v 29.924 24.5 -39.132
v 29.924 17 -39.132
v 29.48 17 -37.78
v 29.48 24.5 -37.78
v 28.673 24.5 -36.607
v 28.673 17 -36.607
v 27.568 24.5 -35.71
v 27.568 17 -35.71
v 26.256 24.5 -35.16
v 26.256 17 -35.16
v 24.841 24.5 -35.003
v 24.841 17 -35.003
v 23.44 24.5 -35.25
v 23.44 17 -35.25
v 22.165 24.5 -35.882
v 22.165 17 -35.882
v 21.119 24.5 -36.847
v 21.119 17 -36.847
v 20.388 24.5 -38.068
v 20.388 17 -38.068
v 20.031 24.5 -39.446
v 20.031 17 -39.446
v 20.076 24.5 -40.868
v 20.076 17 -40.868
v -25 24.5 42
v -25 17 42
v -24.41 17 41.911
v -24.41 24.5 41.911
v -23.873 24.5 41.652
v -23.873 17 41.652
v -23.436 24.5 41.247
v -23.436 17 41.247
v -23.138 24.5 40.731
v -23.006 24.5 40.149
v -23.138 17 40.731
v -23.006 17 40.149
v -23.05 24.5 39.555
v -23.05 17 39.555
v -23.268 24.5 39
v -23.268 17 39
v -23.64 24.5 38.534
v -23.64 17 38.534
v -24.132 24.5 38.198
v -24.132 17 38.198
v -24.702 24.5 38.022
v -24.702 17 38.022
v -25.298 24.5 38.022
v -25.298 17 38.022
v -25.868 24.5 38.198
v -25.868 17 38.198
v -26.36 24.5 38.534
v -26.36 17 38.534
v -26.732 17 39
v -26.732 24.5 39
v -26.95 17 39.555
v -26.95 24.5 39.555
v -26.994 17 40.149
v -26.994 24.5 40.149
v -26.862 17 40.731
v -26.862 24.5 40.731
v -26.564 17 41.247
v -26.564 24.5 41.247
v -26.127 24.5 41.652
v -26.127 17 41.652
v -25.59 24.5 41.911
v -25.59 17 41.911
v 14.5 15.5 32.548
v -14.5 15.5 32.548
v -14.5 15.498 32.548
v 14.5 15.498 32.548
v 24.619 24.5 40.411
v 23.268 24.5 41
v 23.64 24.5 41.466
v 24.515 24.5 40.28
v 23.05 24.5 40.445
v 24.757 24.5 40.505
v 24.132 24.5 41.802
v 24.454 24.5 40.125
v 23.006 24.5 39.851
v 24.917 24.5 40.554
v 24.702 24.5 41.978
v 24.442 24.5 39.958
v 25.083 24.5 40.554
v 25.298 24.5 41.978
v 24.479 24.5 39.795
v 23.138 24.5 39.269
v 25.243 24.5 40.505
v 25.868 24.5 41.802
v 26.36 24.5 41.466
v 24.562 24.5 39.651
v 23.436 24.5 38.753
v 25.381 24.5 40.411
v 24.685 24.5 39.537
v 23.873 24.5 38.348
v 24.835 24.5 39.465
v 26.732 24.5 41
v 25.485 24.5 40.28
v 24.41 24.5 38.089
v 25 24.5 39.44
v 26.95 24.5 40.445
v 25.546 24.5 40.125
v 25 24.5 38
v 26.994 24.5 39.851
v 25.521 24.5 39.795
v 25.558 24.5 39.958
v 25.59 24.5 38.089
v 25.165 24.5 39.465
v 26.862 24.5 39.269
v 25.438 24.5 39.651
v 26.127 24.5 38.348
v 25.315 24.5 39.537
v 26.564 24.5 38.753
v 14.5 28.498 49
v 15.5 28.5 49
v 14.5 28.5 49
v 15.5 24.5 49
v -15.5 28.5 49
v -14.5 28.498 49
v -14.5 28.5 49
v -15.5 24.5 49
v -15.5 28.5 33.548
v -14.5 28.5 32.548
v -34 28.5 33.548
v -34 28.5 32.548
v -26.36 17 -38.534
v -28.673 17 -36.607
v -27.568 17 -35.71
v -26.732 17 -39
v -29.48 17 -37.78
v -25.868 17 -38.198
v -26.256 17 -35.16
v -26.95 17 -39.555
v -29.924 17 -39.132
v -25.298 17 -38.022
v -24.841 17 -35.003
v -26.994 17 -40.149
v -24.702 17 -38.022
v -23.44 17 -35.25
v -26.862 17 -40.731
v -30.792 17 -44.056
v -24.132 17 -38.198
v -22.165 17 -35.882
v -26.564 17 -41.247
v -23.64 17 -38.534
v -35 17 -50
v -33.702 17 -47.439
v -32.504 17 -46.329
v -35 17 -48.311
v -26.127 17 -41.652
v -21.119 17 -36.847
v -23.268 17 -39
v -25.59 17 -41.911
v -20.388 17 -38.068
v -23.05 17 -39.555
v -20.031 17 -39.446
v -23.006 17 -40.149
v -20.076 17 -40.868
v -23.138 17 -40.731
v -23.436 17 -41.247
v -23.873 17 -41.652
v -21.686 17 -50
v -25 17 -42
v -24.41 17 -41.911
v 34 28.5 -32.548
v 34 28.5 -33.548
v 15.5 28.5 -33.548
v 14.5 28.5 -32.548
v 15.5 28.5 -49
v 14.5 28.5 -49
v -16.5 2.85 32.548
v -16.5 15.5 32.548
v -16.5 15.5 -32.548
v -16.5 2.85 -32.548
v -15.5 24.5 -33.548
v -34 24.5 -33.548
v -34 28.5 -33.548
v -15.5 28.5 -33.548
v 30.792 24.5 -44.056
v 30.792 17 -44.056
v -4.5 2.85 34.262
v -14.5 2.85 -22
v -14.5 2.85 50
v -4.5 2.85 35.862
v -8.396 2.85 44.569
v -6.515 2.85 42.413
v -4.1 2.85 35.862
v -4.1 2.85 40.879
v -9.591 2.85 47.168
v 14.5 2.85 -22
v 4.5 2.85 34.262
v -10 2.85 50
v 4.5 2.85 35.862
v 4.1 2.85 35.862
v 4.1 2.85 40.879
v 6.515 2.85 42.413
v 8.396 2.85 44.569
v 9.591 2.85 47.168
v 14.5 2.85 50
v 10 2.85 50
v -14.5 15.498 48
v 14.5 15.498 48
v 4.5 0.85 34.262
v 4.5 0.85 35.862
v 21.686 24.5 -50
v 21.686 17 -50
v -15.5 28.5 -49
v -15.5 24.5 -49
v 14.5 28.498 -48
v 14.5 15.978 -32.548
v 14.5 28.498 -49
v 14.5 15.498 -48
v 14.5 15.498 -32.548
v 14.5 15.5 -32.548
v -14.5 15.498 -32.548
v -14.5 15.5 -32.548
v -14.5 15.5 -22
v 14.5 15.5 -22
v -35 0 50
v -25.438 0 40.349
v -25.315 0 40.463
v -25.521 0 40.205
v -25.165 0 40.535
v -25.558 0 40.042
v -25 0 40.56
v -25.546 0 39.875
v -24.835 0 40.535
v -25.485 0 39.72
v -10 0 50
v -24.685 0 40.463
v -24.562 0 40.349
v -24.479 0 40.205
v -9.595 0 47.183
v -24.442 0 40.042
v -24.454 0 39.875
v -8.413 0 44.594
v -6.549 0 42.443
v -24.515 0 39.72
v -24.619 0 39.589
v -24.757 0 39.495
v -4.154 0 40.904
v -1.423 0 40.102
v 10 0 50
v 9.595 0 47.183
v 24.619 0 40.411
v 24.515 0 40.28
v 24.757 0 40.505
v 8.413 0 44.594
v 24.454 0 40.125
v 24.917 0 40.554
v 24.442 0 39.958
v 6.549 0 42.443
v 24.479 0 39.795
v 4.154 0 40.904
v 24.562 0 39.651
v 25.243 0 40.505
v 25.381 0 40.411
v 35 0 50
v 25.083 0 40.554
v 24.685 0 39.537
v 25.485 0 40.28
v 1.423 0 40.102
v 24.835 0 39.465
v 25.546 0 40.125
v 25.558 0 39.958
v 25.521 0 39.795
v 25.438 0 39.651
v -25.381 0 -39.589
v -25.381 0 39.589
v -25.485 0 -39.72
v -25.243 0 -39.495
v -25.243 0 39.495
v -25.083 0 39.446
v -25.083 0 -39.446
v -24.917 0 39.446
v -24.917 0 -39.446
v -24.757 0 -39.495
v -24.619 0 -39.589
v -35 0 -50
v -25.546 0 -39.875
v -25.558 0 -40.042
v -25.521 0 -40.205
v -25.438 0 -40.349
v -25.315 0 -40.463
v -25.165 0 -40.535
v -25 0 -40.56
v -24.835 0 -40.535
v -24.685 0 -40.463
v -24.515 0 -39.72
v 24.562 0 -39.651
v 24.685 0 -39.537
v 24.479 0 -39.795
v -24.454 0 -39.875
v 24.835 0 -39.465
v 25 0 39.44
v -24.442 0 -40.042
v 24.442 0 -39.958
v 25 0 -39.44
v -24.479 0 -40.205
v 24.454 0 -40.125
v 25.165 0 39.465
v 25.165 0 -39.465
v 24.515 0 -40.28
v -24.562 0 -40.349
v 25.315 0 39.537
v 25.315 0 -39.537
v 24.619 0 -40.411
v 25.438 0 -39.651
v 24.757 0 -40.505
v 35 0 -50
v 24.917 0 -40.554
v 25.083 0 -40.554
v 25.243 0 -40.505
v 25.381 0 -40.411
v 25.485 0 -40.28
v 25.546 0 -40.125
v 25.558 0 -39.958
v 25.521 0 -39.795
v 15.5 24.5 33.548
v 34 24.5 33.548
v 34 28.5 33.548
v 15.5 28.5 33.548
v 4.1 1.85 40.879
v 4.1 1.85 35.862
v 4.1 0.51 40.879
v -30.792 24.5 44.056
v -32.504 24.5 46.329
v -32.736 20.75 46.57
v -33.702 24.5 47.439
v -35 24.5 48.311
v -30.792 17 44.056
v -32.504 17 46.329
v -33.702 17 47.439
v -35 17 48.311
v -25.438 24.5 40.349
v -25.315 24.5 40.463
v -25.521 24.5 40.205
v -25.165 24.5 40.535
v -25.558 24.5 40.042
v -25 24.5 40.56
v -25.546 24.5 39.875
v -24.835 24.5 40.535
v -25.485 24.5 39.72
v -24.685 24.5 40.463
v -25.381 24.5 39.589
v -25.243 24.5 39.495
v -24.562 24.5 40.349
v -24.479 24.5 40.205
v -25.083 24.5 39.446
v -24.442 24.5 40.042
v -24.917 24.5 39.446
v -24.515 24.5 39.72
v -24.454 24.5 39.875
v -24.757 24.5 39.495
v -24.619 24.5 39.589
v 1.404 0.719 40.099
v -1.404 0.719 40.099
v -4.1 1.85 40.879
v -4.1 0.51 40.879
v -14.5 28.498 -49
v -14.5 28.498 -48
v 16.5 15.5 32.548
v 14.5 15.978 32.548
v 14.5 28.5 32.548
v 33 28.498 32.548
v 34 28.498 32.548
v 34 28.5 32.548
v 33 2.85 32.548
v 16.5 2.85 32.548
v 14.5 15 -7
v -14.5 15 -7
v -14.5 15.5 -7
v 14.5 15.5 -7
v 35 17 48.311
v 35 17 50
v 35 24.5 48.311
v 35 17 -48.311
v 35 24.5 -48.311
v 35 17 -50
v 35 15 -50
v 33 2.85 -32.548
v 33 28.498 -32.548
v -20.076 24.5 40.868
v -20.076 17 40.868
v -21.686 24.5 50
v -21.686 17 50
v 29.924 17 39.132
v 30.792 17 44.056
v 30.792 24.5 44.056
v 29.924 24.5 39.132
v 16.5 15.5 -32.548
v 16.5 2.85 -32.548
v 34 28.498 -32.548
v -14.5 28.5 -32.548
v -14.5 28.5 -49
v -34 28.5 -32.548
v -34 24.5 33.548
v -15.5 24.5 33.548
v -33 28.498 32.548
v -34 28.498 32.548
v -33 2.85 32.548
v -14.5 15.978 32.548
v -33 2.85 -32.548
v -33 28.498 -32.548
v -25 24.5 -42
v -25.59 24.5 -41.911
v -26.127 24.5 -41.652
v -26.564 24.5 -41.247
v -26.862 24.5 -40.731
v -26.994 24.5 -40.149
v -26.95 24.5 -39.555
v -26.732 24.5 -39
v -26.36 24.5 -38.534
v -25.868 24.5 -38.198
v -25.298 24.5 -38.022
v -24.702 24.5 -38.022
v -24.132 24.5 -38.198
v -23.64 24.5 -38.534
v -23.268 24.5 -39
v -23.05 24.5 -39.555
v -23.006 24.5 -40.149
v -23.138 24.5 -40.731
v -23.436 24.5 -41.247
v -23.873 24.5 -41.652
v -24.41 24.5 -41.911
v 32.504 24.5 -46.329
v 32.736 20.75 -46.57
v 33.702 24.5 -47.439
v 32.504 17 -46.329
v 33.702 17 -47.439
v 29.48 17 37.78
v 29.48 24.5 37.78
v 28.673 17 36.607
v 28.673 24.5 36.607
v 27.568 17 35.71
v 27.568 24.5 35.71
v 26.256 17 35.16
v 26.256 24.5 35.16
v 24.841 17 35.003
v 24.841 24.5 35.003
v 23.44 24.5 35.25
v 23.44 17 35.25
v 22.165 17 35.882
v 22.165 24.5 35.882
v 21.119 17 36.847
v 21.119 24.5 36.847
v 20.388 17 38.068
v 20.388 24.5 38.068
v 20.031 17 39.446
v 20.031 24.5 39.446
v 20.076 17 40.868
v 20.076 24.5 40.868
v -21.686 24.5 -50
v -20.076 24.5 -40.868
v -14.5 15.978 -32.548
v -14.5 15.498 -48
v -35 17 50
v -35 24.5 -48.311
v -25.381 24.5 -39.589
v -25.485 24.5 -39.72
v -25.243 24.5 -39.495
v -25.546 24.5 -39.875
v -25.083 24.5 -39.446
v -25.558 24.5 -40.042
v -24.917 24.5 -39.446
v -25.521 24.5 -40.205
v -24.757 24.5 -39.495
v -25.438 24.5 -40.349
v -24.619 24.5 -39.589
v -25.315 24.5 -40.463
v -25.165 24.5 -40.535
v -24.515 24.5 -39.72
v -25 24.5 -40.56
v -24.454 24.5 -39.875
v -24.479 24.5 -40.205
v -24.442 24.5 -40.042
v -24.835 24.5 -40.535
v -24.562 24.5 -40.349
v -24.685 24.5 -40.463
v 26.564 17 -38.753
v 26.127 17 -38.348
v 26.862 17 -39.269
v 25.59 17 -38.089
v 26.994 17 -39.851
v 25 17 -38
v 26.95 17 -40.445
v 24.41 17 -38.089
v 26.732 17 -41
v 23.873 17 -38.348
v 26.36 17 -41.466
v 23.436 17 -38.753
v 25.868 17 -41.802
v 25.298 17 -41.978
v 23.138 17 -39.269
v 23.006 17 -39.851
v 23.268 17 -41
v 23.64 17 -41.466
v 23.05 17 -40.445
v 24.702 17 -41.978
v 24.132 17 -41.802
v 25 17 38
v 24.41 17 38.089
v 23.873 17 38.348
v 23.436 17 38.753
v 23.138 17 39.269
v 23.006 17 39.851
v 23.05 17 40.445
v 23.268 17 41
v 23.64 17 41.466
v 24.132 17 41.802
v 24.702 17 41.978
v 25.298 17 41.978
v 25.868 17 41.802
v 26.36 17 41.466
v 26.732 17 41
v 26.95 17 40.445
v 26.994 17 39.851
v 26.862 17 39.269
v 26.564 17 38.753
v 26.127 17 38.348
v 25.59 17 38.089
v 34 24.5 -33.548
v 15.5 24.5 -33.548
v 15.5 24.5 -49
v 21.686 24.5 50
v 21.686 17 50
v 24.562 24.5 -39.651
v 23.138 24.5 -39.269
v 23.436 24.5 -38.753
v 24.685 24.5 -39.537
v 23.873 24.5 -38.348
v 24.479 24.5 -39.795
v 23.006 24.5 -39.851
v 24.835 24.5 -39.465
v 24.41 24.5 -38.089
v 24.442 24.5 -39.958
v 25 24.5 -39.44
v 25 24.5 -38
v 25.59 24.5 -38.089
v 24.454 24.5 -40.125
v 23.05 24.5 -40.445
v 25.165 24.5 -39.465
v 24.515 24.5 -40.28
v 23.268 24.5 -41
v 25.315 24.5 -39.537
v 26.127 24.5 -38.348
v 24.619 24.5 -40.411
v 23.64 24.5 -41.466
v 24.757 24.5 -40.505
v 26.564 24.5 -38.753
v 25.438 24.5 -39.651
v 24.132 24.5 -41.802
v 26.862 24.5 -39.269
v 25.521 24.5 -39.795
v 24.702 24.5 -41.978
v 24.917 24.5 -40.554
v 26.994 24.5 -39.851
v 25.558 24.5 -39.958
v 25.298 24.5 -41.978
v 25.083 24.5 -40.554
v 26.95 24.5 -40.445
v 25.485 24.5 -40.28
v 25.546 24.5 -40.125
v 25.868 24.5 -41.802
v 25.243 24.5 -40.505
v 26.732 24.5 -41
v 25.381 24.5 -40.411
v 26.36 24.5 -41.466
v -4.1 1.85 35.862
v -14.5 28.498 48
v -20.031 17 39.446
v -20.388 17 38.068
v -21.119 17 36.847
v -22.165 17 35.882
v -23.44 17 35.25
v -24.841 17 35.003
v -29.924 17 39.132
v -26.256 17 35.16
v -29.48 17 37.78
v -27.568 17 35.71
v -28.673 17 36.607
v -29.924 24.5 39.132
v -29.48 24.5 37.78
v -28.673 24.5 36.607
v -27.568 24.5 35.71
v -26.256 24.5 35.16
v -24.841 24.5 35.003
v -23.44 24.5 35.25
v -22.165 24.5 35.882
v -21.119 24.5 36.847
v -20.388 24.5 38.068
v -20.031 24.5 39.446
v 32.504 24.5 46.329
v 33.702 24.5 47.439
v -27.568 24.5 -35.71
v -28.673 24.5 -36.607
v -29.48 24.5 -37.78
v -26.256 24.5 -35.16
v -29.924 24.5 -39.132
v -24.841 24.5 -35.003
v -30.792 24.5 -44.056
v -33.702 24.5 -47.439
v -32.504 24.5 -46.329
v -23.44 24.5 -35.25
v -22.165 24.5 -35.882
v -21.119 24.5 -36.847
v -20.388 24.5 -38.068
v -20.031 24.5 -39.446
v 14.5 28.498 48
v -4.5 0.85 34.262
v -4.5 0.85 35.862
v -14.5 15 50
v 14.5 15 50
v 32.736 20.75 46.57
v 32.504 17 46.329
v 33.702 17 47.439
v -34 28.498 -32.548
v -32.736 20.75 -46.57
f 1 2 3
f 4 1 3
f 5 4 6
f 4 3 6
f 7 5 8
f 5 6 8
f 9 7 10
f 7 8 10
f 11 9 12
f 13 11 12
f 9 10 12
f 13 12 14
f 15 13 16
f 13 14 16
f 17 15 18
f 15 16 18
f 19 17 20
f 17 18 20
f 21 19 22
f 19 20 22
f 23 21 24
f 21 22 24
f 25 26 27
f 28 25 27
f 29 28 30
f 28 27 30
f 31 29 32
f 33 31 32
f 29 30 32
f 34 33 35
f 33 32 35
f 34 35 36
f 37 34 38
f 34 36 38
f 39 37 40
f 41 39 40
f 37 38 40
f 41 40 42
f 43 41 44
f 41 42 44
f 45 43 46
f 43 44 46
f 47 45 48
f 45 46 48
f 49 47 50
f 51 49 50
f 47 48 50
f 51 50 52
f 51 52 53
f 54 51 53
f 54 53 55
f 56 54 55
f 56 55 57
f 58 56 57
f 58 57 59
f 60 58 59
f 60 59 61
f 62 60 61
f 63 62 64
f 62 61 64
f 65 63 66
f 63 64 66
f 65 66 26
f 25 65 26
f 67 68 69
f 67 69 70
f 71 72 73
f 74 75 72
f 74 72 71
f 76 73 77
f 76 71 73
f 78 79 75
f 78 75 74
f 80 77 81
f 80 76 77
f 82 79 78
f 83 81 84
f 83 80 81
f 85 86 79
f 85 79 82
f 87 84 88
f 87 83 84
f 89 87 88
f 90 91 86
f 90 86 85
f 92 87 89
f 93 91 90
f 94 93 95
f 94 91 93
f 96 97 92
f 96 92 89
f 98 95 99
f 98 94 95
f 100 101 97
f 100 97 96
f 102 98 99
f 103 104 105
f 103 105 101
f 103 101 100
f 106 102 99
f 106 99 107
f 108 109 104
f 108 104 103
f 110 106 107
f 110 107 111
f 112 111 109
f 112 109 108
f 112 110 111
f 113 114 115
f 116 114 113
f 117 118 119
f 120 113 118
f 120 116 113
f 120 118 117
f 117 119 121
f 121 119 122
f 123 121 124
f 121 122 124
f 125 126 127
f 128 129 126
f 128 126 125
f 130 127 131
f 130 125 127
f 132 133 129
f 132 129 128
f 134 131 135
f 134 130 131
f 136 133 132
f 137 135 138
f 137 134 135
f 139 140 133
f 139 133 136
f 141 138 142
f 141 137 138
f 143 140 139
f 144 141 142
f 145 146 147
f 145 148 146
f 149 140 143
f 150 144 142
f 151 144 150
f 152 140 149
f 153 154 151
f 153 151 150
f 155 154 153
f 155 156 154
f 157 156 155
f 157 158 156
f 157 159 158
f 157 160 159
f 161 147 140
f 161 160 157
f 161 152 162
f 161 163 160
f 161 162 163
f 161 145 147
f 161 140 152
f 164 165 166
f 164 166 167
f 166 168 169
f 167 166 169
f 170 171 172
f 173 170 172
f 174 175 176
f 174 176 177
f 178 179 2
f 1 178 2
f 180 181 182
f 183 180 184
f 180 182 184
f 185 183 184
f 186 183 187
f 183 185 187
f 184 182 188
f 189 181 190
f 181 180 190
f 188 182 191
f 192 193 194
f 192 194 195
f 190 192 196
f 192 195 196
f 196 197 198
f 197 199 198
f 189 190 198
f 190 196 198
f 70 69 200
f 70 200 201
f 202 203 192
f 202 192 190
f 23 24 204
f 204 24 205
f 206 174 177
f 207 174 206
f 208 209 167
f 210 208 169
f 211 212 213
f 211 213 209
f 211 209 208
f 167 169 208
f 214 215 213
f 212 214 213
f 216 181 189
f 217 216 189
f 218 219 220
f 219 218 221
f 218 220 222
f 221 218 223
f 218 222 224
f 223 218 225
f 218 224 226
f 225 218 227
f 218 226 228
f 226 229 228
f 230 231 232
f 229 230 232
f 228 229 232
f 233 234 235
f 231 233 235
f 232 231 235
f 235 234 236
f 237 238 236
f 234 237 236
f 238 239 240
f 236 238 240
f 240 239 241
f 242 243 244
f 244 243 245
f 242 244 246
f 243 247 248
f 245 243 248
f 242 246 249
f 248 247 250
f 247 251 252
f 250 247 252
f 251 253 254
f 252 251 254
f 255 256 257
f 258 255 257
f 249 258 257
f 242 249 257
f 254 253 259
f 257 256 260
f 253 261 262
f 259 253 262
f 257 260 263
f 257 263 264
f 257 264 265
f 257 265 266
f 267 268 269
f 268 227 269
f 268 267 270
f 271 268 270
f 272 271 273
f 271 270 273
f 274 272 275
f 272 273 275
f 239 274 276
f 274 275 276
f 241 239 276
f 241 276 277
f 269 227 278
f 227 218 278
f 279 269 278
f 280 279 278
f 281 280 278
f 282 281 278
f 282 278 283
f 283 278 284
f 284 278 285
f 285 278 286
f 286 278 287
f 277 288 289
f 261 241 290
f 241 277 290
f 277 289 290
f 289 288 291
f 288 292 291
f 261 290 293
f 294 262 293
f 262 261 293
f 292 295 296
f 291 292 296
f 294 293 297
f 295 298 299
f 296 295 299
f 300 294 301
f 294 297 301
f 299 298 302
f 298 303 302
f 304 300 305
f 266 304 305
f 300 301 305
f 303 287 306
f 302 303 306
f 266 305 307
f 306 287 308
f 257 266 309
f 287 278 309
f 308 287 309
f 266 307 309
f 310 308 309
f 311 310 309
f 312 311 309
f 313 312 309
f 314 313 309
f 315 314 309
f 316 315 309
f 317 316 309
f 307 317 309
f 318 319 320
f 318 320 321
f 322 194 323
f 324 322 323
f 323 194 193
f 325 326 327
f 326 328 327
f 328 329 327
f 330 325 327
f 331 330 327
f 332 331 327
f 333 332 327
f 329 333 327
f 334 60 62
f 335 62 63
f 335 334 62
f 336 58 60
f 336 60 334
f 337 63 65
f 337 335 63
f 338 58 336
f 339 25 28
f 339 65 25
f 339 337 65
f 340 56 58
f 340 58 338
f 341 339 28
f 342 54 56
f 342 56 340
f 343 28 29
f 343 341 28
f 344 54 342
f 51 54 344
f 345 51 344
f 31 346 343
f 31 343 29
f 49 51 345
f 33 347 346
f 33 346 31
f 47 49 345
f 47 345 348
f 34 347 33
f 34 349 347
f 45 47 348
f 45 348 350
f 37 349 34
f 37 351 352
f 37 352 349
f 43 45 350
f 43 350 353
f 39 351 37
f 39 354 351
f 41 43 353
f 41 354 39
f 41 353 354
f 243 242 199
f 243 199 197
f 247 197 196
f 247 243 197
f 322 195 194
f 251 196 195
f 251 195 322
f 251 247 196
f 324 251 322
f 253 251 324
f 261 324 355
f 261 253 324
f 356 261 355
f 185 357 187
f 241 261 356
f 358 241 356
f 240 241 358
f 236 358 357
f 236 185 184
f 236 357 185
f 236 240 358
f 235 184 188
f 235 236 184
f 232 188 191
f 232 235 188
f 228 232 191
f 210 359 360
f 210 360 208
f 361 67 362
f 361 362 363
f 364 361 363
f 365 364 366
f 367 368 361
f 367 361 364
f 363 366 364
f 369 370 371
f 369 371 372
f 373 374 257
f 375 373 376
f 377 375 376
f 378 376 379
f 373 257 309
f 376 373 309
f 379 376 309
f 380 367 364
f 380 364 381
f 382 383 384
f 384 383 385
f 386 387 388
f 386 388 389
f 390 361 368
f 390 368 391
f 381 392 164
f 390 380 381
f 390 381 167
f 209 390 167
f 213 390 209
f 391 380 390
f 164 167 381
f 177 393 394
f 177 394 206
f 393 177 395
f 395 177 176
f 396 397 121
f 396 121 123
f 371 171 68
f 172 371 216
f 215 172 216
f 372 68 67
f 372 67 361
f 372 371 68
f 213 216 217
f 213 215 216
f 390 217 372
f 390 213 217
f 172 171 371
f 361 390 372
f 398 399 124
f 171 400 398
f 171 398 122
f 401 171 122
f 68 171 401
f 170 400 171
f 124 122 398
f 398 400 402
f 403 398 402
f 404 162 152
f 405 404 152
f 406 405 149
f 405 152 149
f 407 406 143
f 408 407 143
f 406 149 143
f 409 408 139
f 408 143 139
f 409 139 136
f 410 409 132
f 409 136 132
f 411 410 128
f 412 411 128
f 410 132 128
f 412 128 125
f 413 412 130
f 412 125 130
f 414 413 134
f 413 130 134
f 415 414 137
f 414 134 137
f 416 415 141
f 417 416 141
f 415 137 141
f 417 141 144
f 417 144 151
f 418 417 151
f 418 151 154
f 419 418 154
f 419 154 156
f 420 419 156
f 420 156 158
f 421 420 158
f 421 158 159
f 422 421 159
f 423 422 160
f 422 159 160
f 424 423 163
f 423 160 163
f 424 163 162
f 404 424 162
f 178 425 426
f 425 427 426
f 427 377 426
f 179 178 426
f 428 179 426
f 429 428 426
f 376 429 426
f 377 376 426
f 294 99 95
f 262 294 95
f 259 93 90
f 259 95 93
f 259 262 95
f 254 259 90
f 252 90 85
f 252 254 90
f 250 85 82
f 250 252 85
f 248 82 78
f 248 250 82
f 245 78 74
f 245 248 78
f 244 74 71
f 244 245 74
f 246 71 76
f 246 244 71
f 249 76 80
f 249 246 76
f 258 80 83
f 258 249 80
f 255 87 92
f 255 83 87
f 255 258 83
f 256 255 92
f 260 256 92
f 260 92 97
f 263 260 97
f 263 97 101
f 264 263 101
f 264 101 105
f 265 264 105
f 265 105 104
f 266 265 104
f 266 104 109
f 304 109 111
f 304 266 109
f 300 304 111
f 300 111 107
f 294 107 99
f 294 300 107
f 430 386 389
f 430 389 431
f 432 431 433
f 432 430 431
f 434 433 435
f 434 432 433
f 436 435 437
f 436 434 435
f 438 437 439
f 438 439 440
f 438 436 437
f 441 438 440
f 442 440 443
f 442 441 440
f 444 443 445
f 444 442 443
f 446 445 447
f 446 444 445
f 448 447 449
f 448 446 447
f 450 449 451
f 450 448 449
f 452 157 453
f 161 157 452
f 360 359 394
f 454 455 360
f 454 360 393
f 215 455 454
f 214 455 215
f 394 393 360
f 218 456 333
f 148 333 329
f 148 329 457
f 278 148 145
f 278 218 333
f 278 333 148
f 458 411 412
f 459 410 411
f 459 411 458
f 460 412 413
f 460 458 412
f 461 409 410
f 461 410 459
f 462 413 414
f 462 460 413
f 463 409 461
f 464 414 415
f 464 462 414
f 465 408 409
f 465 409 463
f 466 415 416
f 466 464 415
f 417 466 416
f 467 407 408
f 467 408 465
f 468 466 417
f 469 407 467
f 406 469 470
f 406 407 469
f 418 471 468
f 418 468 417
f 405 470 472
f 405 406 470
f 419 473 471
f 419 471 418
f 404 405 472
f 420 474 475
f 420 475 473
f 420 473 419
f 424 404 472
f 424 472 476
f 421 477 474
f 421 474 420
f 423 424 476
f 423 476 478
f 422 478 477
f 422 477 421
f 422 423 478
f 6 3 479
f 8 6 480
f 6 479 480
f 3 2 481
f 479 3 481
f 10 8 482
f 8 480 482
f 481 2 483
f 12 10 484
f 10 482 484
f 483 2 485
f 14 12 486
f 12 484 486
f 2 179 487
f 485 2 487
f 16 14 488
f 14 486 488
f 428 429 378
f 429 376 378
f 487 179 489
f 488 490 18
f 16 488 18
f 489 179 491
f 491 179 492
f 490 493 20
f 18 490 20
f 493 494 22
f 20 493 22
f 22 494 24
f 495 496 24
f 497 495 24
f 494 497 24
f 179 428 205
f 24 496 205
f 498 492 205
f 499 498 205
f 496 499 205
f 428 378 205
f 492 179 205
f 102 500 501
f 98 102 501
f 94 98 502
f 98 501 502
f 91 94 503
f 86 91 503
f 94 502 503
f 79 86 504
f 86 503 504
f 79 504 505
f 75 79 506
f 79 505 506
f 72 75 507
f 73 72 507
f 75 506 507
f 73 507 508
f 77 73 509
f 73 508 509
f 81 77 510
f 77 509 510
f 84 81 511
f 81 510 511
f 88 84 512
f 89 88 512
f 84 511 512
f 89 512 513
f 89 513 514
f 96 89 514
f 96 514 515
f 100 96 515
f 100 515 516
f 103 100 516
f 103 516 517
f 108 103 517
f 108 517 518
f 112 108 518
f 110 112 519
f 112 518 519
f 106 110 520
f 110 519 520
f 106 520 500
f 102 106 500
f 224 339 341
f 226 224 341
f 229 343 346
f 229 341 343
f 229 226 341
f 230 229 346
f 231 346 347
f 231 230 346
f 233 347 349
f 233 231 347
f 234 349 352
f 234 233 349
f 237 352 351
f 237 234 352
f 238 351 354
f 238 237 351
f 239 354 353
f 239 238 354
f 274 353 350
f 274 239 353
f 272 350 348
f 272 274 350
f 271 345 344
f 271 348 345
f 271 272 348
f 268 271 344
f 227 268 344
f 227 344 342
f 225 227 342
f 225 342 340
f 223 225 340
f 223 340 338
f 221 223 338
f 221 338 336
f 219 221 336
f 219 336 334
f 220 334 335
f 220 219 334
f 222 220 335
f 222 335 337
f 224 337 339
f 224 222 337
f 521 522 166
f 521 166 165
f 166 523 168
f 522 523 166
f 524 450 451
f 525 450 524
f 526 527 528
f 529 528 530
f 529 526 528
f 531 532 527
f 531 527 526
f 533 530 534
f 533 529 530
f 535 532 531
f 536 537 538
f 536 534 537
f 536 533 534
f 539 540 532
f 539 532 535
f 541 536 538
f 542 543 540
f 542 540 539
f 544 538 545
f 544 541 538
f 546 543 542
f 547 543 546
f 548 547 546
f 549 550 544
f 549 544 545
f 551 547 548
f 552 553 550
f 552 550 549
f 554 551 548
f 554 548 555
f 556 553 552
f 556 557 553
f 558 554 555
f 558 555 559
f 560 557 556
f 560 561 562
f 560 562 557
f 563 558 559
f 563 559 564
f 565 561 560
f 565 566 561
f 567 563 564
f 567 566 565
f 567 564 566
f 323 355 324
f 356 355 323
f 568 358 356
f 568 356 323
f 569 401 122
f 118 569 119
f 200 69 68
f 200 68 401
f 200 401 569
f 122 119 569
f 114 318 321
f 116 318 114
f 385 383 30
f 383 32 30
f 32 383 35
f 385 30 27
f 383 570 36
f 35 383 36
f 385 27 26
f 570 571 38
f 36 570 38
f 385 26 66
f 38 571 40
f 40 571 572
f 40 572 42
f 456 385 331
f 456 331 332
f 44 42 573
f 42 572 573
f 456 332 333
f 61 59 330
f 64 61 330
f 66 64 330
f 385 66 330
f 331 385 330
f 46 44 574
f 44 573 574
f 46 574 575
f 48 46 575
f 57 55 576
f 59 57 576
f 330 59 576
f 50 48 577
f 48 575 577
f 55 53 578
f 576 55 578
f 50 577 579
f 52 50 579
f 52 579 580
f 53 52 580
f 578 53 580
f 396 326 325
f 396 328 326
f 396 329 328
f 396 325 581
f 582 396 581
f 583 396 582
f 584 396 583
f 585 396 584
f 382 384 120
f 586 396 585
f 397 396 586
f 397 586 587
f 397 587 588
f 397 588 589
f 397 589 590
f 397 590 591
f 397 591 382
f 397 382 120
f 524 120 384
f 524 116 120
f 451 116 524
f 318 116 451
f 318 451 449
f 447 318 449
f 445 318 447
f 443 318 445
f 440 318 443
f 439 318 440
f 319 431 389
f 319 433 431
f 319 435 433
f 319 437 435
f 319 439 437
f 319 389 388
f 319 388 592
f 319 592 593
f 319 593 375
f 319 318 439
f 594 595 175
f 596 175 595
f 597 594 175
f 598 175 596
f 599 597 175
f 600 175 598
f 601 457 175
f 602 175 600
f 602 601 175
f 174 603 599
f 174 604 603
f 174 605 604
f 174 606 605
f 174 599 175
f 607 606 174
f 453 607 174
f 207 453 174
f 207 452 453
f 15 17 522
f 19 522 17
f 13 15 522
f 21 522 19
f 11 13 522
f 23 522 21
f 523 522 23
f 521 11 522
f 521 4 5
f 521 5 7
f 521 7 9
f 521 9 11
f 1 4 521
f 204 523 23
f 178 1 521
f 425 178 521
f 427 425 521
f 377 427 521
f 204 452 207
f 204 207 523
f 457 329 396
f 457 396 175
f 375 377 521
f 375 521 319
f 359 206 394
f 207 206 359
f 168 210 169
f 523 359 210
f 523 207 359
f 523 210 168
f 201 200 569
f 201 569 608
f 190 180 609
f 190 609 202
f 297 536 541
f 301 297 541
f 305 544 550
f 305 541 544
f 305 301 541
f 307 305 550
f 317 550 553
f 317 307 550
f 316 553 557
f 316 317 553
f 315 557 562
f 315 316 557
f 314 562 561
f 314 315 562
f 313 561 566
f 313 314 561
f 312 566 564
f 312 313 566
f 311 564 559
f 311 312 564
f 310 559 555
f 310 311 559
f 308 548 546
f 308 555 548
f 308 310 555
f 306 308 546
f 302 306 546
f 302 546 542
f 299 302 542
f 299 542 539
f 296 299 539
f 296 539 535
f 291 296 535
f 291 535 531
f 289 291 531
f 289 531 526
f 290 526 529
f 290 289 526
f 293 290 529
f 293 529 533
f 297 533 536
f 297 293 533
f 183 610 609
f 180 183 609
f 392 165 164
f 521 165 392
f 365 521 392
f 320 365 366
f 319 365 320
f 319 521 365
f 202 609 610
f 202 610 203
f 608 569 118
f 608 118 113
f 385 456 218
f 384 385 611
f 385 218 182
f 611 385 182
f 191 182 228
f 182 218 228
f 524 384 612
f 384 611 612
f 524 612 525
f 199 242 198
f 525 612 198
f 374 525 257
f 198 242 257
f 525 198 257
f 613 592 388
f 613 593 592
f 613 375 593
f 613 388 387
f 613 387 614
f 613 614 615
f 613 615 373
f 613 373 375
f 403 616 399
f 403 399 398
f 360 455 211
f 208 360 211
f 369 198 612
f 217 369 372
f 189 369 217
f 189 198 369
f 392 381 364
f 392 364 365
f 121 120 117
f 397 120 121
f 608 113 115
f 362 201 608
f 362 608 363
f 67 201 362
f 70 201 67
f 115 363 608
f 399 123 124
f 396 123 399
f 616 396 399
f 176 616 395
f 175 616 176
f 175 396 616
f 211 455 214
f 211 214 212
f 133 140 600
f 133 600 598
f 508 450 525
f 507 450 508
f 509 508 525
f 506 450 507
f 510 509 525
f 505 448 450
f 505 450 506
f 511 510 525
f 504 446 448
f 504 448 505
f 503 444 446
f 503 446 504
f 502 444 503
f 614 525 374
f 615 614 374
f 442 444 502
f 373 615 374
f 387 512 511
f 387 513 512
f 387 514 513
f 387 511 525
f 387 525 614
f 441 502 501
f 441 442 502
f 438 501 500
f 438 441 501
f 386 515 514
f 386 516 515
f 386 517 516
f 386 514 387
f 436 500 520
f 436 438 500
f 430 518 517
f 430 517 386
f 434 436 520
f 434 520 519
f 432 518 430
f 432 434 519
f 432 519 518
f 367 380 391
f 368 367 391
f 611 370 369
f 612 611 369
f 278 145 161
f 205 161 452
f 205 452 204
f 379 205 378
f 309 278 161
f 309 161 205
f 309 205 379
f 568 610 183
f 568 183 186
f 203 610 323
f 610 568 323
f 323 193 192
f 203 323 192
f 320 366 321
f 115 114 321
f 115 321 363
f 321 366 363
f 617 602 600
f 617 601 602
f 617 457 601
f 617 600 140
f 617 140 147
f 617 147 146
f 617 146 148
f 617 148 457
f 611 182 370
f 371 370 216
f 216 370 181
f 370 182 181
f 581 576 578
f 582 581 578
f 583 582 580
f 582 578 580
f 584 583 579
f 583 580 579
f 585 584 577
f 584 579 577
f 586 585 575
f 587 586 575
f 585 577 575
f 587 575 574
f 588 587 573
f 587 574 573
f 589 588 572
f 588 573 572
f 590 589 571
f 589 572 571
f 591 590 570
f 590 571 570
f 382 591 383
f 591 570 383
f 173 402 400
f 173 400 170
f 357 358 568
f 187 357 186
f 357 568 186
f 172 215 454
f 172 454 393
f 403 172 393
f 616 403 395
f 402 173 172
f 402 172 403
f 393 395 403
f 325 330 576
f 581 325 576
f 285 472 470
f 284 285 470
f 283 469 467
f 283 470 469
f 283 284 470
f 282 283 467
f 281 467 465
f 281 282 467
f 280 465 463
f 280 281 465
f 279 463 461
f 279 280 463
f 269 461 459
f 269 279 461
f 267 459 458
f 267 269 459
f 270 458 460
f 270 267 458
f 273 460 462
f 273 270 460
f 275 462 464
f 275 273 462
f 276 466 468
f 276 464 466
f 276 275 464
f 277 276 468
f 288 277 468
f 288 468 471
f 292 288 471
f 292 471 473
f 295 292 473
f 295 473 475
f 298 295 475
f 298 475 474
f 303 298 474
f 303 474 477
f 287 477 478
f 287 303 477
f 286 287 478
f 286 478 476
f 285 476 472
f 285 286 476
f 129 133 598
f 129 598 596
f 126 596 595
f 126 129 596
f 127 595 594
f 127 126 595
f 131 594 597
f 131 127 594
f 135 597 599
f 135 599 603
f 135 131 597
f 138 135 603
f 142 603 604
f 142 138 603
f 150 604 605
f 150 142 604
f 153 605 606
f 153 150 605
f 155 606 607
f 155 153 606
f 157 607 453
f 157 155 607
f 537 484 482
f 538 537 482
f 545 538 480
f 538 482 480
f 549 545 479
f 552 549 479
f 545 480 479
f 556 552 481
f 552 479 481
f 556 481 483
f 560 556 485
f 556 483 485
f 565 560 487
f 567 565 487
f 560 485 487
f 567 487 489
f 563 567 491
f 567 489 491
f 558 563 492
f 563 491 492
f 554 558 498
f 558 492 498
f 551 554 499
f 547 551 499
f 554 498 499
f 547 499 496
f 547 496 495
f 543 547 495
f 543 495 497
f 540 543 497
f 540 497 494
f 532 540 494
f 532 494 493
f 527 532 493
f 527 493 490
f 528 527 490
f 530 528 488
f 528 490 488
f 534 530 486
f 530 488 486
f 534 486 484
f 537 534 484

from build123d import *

# Parameters (mm, degrees)
CROQUIS1_W                    = 70
CROQUIS1_H                    = 100
SALIENTE_EXTRUIR1_DEPTH       = 15
CROQUIS2_W                    = 29
CROQUIS2_H                    = 12.15
CORTAR_EXTRUIR1_DEPTH         = 72
CORTAR_EXTRUIR2_DEPTH         = 72
CROQUIS4_W                    = 9
CROQUIS4_H                    = 1.6
CORTAR_EXTRUIR3_DEPTH         = 2
CROQUIS6_W                    = 8.2
CROQUIS6_H                    = 2
CORTAR_EXTRUIR4_DEPTH         = 94.926889384
CORTAR_EXTRUIR5_DEPTH         = 8.2
CROQUIS8_W                    = 70
CROQUIS8_H                    = 57
SALIENTE_EXTRUIR3_DEPTH       = 2
CROQUIS9_W                    = 20.5
CROQUIS9_H                    = 15
SALIENTE_EXTRUIR4_DEPTH       = 2
CROQUIS10_W                   = 70
CROQUIS10_H                   = 22.450330877
SALIENTE_EXTRUIR5_DEPTH       = 2
CROQUIS12_W                   = 70
CROQUIS12_H                   = 100
CROQUIS12_W_2                 = 29
CROQUIS12_H_2                 = 15
SALIENTE_EXTRUIR6_DEPTH       = 7.5
CROQUIS11_R                   = 2
CORTAR_EXTRUIR6_DEPTH         = 7.5
CORTAR_EXTRUIR7_DEPTH         = 7.5
CROQUIS15_W                   = 29
CROQUIS15_H                   = 8.521564644
CORTAR_EXTRUIR8_DEPTH         = 109.743965496
CROQUIS16_W                   = 70
CROQUIS16_H                   = 65.095762462
CORTAR_EXTRUIR9_DEPTH         = 9
CROQUIS17_W                   = 29
CROQUIS17_H                   = 17.452118769
CORTAR_EXTRUIR10_DEPTH        = 0.48
CROQUIS19_W                   = 16.5
CROQUIS19_H                   = 65.095762462
CORTAR_EXTRUIR12_DEPTH        = 12.65
CORTAR_EXTRUIR13_DEPTH        = 66.766633044
CORTAR_EXTRUIR13_DEPTH_BACK   = 66.766633044
CROQUIS23_R                   = 0.56
CROQUIS24_W                   = 29
CROQUIS24_H                   = 1
CROQUIS24_W_2                 = 1
CROQUIS24_H_2                 = 65.095762462
SALIENTE_EXTRUIR8_DEPTH       = 13
SALIENTE_EXTRUIR9_START       = -0.001564644
SALIENTE_EXTRUIR9_OUTLINE_W   = 29
SALIENTE_EXTRUIR9_OUTLINE_H   = 1
SALIENTE_EXTRUIR9_OUTLINE_W_2 = 1
SALIENTE_EXTRUIR9_OUTLINE_H_2 = 65.095762462
SALIENTE_EXTRUIR9_DEPTH       = 9.001564644
SALIENTE_EXTRUIR10_DEPTH      = 4


# Read off the part's stored shape, not the designer's step: Saliente-Extruir9
with BuildPart() as part:
    # Croquis1 → Saliente-Extruir1 (new body)
    with BuildSketch(Plane(origin=(0, 0, 0), x_dir=(1, 0, 0), z_dir=(0, 1, 0))):
        Rectangle(CROQUIS1_W, CROQUIS1_H)
    extrude(amount=SALIENTE_EXTRUIR1_DEPTH)

    # Croquis2 → Cortar-Extruir1 (cut)
    with BuildSketch(Plane.XY.offset(50)):
        with Locations((0, 8.925)):
            Rectangle(CROQUIS2_W, CROQUIS2_H)
    extrude(amount=-CORTAR_EXTRUIR1_DEPTH, mode=Mode.SUBTRACT)

    # Croquis3 → Cortar-Extruir2 (cut)
    with BuildSketch(Plane.XZ):
        with BuildLine():
            Line((-10, 50), (10, 50))
            ThreePointArc((10, 50), (0, 40), (-10, 50))
        make_face()
    extrude(amount=-CORTAR_EXTRUIR2_DEPTH, mode=Mode.SUBTRACT)

    # Croquis4 → Cortar-Extruir3 (cut)
    with BuildSketch(Plane(origin=(0, 2.85, 0), x_dir=(1, 0, 0), z_dir=(0, 1, 0))):
        with Locations((0, -35.061869007)):
            Rectangle(CROQUIS4_W, CROQUIS4_H)
    extrude(amount=-CORTAR_EXTRUIR3_DEPTH, mode=Mode.SUBTRACT)

    # Croquis6 → Cortar-Extruir4 (cut, through all)
    with BuildSketch(Plane(origin=(0, 0, 35.861869007), x_dir=(-1, 0, 0), z_dir=(0, 0, -1))):
        with Locations((0, 2.85)):
            Rectangle(CROQUIS6_W, CROQUIS6_H)
    extrude(amount=-CORTAR_EXTRUIR4_DEPTH, mode=Mode.SUBTRACT)

    # Croquis7 → Cortar-Extruir5 (cut)
    with BuildSketch(Plane(origin=(-4.1, 0, 0), x_dir=(0, 0, -1), z_dir=(1, 0, 0))):
        Polygon((-40.879144777, 0.510423286), (-35.861869007, 1.85), (-40.879144777, 1.85), align=None)
    extrude(amount=CORTAR_EXTRUIR5_DEPTH, mode=Mode.SUBTRACT)

    # Croquis8 → Saliente-Extruir3 (add)
    with BuildSketch(Plane(origin=(0, 15, 0), x_dir=(1, 0, 0), z_dir=(0, 1, 0))):
        with Locations((0, -21.5)):
            Rectangle(CROQUIS8_W, CROQUIS8_H)
        Polygon((14.5, 22), (35, 22), (35, 27.549669123), (-35, 27.549669123), (-35, 22), align=None)
    extrude(amount=SALIENTE_EXTRUIR3_DEPTH)

    # Croquis9 → Saliente-Extruir4 (add)
    with BuildSketch(Plane(origin=(0, 15, 0), x_dir=(1, 0, 0), z_dir=(0, 1, 0))):
        with Locations((-24.75, 14.5)):
            Rectangle(CROQUIS9_W, CROQUIS9_H)
        with Locations((24.75, 14.5)):
            Rectangle(CROQUIS9_W, CROQUIS9_H)
    extrude(amount=SALIENTE_EXTRUIR4_DEPTH)

    # Croquis10 → Saliente-Extruir5 (add)
    with BuildSketch(Plane(origin=(0, 15, 0), x_dir=(1, 0, 0), z_dir=(0, 1, 0))):
        with Locations((0, 38.774834562)):
            Rectangle(CROQUIS10_W, CROQUIS10_H)
    extrude(amount=SALIENTE_EXTRUIR5_DEPTH)

    # Croquis12 → Saliente-Extruir6 (add)
    with BuildSketch(Plane(origin=(0, 17, 0), x_dir=(1, 0, 0), z_dir=(0, 1, 0))):
        Rectangle(CROQUIS12_W, CROQUIS12_H)
        with Locations((0, 14.5)):
            Rectangle(CROQUIS12_W_2, CROQUIS12_H_2, mode=Mode.SUBTRACT)
    extrude(amount=SALIENTE_EXTRUIR6_DEPTH)

    # Croquis11 → Cortar-Extruir6 (cut)
    # profile 1 of 4: a face of its own
    with BuildSketch(Plane(origin=(0, 17, 0), x_dir=(1, 0, 0), z_dir=(0, 1, 0))):
        with BuildLine():
            Line((20.075961235, 40.868240888), (21.812443012, 50.716318418))
            ThreePointArc((21.812443012, 50.716318418), (27.604722665, 54.772116295), (31.660520542, 48.979836642))
            Line((31.660520542, 48.979836642), (29.924038765, 39.131759112))
            ThreePointArc((29.924038765, 39.131759112), (24.131759112, 35.075961235), (20.075961235, 40.868240888))
        make_face()
        with Locations(Location((25, 40, 0), (0, 0, 270))):
            Circle(CROQUIS11_R, mode=Mode.SUBTRACT)
    # profile 2 of 4: a face of its own
    with BuildSketch(Plane(origin=(0, 17, 0), x_dir=(1, 0, 0), z_dir=(0, 1, 0))):
        with BuildLine():
            Line((-20.075961235, 40.868240888), (-21.812443012, 50.716318418))
            ThreePointArc((-21.812443012, 50.716318418), (-27.604722665, 54.772116295), (-31.660520542, 48.979836642))
            Line((-31.660520542, 48.979836642), (-29.924038765, 39.131759112))
            ThreePointArc((-29.924038765, 39.131759112), (-24.131759112, 35.075961235), (-20.075961235, 40.868240888))
        make_face()
        with Locations(Location((-25, 40, 0), (0, 0, 90))):
            Circle(CROQUIS11_R, mode=Mode.SUBTRACT)
    # profile 3 of 4: a face of its own
    with BuildSketch(Plane(origin=(0, 17, 0), x_dir=(1, 0, 0), z_dir=(0, 1, 0))):
        with BuildLine():
            Line((20.075961235, -40.868240888), (21.812443012, -50.716318418))
            ThreePointArc((21.812443012, -50.716318418), (27.604722665, -54.772116295), (31.660520542, -48.979836642))
            Line((31.660520542, -48.979836642), (29.924038765, -39.131759112))
            ThreePointArc((29.924038765, -39.131759112), (24.131759112, -35.075961235), (20.075961235, -40.868240888))
        make_face()
        with Locations(Location((25, -40, 0), (0, 0, 90))):
            Circle(CROQUIS11_R, mode=Mode.SUBTRACT)
    # profile 4 of 4: a face of its own
    with BuildSketch(Plane(origin=(0, 17, 0), x_dir=(1, 0, 0), z_dir=(0, 1, 0))):
        with BuildLine():
            Line((-20.075961235, -40.868240888), (-21.812443012, -50.716318418))
            ThreePointArc((-21.812443012, -50.716318418), (-27.604722665, -54.772116295), (-31.660520542, -48.979836642))
            Line((-31.660520542, -48.979836642), (-29.924038765, -39.131759112))
            ThreePointArc((-29.924038765, -39.131759112), (-24.131759112, -35.075961235), (-20.075961235, -40.868240888))
        make_face()
        with Locations(Location((-25, -40, 0), (0, 0, 270))):
            Circle(CROQUIS11_R, mode=Mode.SUBTRACT)
    extrude(amount=CORTAR_EXTRUIR6_DEPTH, mode=Mode.SUBTRACT)

    # Croquis13 → Cortar-Extruir7 (cut)
    with BuildSketch(Plane(origin=(0, 24.5, 0), x_dir=(1, 0, 0), z_dir=(0, 1, 0))):
        with BuildLine():
            Line((30.792279653, 44.055797877), (30.792279653, 51.405221368))
            Line((30.792279653, 51.405221368), (45.333912294, 51.405221368))
            Line((45.333912294, 51.405221368), (45.333912294, 48.355988615))
            add(Edge.make_bspline(
                [(30.792279653, 44.055797877), (35.665326883, 51.984846729), (45.333912294, 48.355988615)],
                knots=[0, 0, 0, 1, 1, 1], degree=2))
        make_face()
        with BuildLine():
            Line((-30.792279653, 51.405221368), (-45.333912294, 51.405221368))
            Line((-45.333912294, 51.405221368), (-45.333912294, 48.355988615))
            add(Edge.make_bspline(
                [(-30.792279653, 44.055797877), (-35.665326883, 51.984846729), (-45.333912294, 48.355988615)],
                knots=[0, 0, 0, 1, 1, 1], degree=2))
            Line((-30.792279653, 44.055797877), (-30.792279653, 51.405221368))
        make_face()
        with BuildLine():
            Line((30.792279653, -51.405221368), (45.333912294, -51.405221368))
            Line((45.333912294, -51.405221368), (45.333912294, -48.355988615))
            add(Edge.make_bspline(
                [(30.792279653, -44.055797877), (35.665326883, -51.984846729), (45.333912294, -48.355988615)],
                knots=[0, 0, 0, 1, 1, 1], degree=2))
            Line((30.792279653, -44.055797877), (30.792279653, -51.405221368))
        make_face()
        with BuildLine():
            Line((-30.792279653, -44.055797877), (-30.792279653, -51.405221368))
            Line((-30.792279653, -51.405221368), (-45.333912294, -51.405221368))
            Line((-45.333912294, -51.405221368), (-45.333912294, -48.355988615))
            add(Edge.make_bspline(
                [(-30.792279653, -44.055797877), (-35.665326883, -51.984846729), (-45.333912294, -48.355988615)],
                knots=[0, 0, 0, 1, 1, 1], degree=2))
        make_face()
    extrude(amount=-CORTAR_EXTRUIR7_DEPTH, mode=Mode.SUBTRACT)

    # Croquis15 → Cortar-Extruir8 (cut, through all)
    with BuildSketch(Plane(origin=(0, 0, -50), x_dir=(-1, 0, 0), z_dir=(0, 0, -1))):
        with Locations((0, 20.239217678)):
            Rectangle(CROQUIS15_W, CROQUIS15_H)
    extrude(amount=-CORTAR_EXTRUIR8_DEPTH, mode=Mode.SUBTRACT)

    # Croquis16 → Cortar-Extruir9 (cut)
    with BuildSketch(Plane(origin=(0, 24.5, 0), x_dir=(1, 0, 0), z_dir=(0, 1, 0))):
        Rectangle(CROQUIS16_W, CROQUIS16_H)
    extrude(amount=-CORTAR_EXTRUIR9_DEPTH, mode=Mode.SUBTRACT)

    # Croquis17 → Cortar-Extruir10 (cut)
    with BuildSketch(Plane(origin=(0, 15.978435356, 0), x_dir=(1, 0, 0), z_dir=(0, 1, 0))):
        with Locations((0, 41.273940616)):
            Rectangle(CROQUIS17_W, CROQUIS17_H)
        with Locations((0, -41.273940616)):
            Rectangle(CROQUIS17_W, CROQUIS17_H)
    extrude(amount=-CORTAR_EXTRUIR10_DEPTH, mode=Mode.SUBTRACT)

    # Croquis19 → Cortar-Extruir12 (cut)
    with BuildSketch(Plane(origin=(0, 15.5, 0), x_dir=(1, 0, 0), z_dir=(0, 1, 0))):
        with Locations((-24.75, 0)):
            Rectangle(CROQUIS19_W, CROQUIS19_H)
    cortar_extruir12 = extrude(amount=-CORTAR_EXTRUIR12_DEPTH, mode=Mode.SUBTRACT)

    # Simetría1: Cortar-Extruir12 across plane
    add(cortar_extruir12.mirror(Plane(origin=(0, 0, 0), x_dir=(0, 0, 1), z_dir=(1, 0, 0))), mode=Mode.SUBTRACT)

    # Croquis23 → Cortar-Extruir13 (cut, two sides: drawn at the far end of the back side and taken through both)
    with BuildSketch(Plane(origin=(0, 24.5, 0), x_dir=(1, 0, 0), z_dir=(0, 1, 0)).offset(-CORTAR_EXTRUIR13_DEPTH_BACK)):
        with Locations(Location((-25, -40, 0), (0, 0, 270))):
            Circle(CROQUIS23_R)
        with Locations(Location((-25, 40, 0), (0, 0, 90))):
            Circle(CROQUIS23_R)
        with Locations(Location((25, 40, 0), (0, 0, 270))):
            Circle(CROQUIS23_R)
        with Locations(Location((25, -40, 0), (0, 0, 90))):
            Circle(CROQUIS23_R)
    extrude(amount=CORTAR_EXTRUIR13_DEPTH + CORTAR_EXTRUIR13_DEPTH_BACK, mode=Mode.SUBTRACT)

    # Croquis24 → Saliente-Extruir8 (add)
    with BuildSketch(Plane(origin=(0, 15.498435356, 0), x_dir=(1, 0, 0), z_dir=(0, 1, 0))):
        with Locations((0, -48.5)):
            Rectangle(CROQUIS24_W, CROQUIS24_H)
        with Locations((33.5, 0)):
            Rectangle(CROQUIS24_W_2, CROQUIS24_H_2)
        with Locations((-33.5, 0)):
            Rectangle(CROQUIS24_W_2, CROQUIS24_H_2)
        with Locations((0, 48.5)):
            Rectangle(CROQUIS24_W, CROQUIS24_H)
    extrude(amount=SALIENTE_EXTRUIR8_DEPTH)

    # Saliente-Extruir9 outline → Saliente-Extruir9 (add)
    with BuildSketch(Plane(origin=(0, 15.5, 0), x_dir=(1, 0, 0), z_dir=(0, 1, 0)).offset(SALIENTE_EXTRUIR9_START)):
        with Locations((0, 49.5)):
            Rectangle(SALIENTE_EXTRUIR9_OUTLINE_W, SALIENTE_EXTRUIR9_OUTLINE_H)
        with Locations((-34.5, 0)):
            Rectangle(SALIENTE_EXTRUIR9_OUTLINE_W_2, SALIENTE_EXTRUIR9_OUTLINE_H_2)
        with Locations((34.5, 0)):
            Rectangle(SALIENTE_EXTRUIR9_OUTLINE_W_2, SALIENTE_EXTRUIR9_OUTLINE_H_2)
        with Locations((0, -49.5)):
            Rectangle(SALIENTE_EXTRUIR9_OUTLINE_W, SALIENTE_EXTRUIR9_OUTLINE_H)
    extrude(amount=SALIENTE_EXTRUIR9_DEPTH)

    # Croquis26 → Saliente-Extruir10 (add)
    with BuildSketch(Plane(origin=(0, 24.5, 0), x_dir=(1, 0, 0), z_dir=(0, 1, 0))):
        Polygon((-14.5, -49), (-15.5, -49), (-15.5, -33.547881231), (-34, -33.547881231), (-34, -32.547881231), (-14.5, -32.547881231), align=None)
        Polygon((14.5, -49), (14.5, -32.547881231), (34, -32.547881231), (34, -33.547881231), (15.5, -33.547881231), (15.5, -49), align=None)
        Polygon((14.5, 49), (15.5, 49), (15.5, 33.547881231), (34, 33.547881231), (34, 32.547881231), (14.5, 32.547881231), align=None)
        Polygon((-14.5, 49), (-14.5, 32.547881231), (-34, 32.547881231), (-34, 33.547881231), (-15.5, 33.547881231), (-15.5, 49), align=None)
    extrude(amount=SALIENTE_EXTRUIR10_DEPTH)


solid = part.part
